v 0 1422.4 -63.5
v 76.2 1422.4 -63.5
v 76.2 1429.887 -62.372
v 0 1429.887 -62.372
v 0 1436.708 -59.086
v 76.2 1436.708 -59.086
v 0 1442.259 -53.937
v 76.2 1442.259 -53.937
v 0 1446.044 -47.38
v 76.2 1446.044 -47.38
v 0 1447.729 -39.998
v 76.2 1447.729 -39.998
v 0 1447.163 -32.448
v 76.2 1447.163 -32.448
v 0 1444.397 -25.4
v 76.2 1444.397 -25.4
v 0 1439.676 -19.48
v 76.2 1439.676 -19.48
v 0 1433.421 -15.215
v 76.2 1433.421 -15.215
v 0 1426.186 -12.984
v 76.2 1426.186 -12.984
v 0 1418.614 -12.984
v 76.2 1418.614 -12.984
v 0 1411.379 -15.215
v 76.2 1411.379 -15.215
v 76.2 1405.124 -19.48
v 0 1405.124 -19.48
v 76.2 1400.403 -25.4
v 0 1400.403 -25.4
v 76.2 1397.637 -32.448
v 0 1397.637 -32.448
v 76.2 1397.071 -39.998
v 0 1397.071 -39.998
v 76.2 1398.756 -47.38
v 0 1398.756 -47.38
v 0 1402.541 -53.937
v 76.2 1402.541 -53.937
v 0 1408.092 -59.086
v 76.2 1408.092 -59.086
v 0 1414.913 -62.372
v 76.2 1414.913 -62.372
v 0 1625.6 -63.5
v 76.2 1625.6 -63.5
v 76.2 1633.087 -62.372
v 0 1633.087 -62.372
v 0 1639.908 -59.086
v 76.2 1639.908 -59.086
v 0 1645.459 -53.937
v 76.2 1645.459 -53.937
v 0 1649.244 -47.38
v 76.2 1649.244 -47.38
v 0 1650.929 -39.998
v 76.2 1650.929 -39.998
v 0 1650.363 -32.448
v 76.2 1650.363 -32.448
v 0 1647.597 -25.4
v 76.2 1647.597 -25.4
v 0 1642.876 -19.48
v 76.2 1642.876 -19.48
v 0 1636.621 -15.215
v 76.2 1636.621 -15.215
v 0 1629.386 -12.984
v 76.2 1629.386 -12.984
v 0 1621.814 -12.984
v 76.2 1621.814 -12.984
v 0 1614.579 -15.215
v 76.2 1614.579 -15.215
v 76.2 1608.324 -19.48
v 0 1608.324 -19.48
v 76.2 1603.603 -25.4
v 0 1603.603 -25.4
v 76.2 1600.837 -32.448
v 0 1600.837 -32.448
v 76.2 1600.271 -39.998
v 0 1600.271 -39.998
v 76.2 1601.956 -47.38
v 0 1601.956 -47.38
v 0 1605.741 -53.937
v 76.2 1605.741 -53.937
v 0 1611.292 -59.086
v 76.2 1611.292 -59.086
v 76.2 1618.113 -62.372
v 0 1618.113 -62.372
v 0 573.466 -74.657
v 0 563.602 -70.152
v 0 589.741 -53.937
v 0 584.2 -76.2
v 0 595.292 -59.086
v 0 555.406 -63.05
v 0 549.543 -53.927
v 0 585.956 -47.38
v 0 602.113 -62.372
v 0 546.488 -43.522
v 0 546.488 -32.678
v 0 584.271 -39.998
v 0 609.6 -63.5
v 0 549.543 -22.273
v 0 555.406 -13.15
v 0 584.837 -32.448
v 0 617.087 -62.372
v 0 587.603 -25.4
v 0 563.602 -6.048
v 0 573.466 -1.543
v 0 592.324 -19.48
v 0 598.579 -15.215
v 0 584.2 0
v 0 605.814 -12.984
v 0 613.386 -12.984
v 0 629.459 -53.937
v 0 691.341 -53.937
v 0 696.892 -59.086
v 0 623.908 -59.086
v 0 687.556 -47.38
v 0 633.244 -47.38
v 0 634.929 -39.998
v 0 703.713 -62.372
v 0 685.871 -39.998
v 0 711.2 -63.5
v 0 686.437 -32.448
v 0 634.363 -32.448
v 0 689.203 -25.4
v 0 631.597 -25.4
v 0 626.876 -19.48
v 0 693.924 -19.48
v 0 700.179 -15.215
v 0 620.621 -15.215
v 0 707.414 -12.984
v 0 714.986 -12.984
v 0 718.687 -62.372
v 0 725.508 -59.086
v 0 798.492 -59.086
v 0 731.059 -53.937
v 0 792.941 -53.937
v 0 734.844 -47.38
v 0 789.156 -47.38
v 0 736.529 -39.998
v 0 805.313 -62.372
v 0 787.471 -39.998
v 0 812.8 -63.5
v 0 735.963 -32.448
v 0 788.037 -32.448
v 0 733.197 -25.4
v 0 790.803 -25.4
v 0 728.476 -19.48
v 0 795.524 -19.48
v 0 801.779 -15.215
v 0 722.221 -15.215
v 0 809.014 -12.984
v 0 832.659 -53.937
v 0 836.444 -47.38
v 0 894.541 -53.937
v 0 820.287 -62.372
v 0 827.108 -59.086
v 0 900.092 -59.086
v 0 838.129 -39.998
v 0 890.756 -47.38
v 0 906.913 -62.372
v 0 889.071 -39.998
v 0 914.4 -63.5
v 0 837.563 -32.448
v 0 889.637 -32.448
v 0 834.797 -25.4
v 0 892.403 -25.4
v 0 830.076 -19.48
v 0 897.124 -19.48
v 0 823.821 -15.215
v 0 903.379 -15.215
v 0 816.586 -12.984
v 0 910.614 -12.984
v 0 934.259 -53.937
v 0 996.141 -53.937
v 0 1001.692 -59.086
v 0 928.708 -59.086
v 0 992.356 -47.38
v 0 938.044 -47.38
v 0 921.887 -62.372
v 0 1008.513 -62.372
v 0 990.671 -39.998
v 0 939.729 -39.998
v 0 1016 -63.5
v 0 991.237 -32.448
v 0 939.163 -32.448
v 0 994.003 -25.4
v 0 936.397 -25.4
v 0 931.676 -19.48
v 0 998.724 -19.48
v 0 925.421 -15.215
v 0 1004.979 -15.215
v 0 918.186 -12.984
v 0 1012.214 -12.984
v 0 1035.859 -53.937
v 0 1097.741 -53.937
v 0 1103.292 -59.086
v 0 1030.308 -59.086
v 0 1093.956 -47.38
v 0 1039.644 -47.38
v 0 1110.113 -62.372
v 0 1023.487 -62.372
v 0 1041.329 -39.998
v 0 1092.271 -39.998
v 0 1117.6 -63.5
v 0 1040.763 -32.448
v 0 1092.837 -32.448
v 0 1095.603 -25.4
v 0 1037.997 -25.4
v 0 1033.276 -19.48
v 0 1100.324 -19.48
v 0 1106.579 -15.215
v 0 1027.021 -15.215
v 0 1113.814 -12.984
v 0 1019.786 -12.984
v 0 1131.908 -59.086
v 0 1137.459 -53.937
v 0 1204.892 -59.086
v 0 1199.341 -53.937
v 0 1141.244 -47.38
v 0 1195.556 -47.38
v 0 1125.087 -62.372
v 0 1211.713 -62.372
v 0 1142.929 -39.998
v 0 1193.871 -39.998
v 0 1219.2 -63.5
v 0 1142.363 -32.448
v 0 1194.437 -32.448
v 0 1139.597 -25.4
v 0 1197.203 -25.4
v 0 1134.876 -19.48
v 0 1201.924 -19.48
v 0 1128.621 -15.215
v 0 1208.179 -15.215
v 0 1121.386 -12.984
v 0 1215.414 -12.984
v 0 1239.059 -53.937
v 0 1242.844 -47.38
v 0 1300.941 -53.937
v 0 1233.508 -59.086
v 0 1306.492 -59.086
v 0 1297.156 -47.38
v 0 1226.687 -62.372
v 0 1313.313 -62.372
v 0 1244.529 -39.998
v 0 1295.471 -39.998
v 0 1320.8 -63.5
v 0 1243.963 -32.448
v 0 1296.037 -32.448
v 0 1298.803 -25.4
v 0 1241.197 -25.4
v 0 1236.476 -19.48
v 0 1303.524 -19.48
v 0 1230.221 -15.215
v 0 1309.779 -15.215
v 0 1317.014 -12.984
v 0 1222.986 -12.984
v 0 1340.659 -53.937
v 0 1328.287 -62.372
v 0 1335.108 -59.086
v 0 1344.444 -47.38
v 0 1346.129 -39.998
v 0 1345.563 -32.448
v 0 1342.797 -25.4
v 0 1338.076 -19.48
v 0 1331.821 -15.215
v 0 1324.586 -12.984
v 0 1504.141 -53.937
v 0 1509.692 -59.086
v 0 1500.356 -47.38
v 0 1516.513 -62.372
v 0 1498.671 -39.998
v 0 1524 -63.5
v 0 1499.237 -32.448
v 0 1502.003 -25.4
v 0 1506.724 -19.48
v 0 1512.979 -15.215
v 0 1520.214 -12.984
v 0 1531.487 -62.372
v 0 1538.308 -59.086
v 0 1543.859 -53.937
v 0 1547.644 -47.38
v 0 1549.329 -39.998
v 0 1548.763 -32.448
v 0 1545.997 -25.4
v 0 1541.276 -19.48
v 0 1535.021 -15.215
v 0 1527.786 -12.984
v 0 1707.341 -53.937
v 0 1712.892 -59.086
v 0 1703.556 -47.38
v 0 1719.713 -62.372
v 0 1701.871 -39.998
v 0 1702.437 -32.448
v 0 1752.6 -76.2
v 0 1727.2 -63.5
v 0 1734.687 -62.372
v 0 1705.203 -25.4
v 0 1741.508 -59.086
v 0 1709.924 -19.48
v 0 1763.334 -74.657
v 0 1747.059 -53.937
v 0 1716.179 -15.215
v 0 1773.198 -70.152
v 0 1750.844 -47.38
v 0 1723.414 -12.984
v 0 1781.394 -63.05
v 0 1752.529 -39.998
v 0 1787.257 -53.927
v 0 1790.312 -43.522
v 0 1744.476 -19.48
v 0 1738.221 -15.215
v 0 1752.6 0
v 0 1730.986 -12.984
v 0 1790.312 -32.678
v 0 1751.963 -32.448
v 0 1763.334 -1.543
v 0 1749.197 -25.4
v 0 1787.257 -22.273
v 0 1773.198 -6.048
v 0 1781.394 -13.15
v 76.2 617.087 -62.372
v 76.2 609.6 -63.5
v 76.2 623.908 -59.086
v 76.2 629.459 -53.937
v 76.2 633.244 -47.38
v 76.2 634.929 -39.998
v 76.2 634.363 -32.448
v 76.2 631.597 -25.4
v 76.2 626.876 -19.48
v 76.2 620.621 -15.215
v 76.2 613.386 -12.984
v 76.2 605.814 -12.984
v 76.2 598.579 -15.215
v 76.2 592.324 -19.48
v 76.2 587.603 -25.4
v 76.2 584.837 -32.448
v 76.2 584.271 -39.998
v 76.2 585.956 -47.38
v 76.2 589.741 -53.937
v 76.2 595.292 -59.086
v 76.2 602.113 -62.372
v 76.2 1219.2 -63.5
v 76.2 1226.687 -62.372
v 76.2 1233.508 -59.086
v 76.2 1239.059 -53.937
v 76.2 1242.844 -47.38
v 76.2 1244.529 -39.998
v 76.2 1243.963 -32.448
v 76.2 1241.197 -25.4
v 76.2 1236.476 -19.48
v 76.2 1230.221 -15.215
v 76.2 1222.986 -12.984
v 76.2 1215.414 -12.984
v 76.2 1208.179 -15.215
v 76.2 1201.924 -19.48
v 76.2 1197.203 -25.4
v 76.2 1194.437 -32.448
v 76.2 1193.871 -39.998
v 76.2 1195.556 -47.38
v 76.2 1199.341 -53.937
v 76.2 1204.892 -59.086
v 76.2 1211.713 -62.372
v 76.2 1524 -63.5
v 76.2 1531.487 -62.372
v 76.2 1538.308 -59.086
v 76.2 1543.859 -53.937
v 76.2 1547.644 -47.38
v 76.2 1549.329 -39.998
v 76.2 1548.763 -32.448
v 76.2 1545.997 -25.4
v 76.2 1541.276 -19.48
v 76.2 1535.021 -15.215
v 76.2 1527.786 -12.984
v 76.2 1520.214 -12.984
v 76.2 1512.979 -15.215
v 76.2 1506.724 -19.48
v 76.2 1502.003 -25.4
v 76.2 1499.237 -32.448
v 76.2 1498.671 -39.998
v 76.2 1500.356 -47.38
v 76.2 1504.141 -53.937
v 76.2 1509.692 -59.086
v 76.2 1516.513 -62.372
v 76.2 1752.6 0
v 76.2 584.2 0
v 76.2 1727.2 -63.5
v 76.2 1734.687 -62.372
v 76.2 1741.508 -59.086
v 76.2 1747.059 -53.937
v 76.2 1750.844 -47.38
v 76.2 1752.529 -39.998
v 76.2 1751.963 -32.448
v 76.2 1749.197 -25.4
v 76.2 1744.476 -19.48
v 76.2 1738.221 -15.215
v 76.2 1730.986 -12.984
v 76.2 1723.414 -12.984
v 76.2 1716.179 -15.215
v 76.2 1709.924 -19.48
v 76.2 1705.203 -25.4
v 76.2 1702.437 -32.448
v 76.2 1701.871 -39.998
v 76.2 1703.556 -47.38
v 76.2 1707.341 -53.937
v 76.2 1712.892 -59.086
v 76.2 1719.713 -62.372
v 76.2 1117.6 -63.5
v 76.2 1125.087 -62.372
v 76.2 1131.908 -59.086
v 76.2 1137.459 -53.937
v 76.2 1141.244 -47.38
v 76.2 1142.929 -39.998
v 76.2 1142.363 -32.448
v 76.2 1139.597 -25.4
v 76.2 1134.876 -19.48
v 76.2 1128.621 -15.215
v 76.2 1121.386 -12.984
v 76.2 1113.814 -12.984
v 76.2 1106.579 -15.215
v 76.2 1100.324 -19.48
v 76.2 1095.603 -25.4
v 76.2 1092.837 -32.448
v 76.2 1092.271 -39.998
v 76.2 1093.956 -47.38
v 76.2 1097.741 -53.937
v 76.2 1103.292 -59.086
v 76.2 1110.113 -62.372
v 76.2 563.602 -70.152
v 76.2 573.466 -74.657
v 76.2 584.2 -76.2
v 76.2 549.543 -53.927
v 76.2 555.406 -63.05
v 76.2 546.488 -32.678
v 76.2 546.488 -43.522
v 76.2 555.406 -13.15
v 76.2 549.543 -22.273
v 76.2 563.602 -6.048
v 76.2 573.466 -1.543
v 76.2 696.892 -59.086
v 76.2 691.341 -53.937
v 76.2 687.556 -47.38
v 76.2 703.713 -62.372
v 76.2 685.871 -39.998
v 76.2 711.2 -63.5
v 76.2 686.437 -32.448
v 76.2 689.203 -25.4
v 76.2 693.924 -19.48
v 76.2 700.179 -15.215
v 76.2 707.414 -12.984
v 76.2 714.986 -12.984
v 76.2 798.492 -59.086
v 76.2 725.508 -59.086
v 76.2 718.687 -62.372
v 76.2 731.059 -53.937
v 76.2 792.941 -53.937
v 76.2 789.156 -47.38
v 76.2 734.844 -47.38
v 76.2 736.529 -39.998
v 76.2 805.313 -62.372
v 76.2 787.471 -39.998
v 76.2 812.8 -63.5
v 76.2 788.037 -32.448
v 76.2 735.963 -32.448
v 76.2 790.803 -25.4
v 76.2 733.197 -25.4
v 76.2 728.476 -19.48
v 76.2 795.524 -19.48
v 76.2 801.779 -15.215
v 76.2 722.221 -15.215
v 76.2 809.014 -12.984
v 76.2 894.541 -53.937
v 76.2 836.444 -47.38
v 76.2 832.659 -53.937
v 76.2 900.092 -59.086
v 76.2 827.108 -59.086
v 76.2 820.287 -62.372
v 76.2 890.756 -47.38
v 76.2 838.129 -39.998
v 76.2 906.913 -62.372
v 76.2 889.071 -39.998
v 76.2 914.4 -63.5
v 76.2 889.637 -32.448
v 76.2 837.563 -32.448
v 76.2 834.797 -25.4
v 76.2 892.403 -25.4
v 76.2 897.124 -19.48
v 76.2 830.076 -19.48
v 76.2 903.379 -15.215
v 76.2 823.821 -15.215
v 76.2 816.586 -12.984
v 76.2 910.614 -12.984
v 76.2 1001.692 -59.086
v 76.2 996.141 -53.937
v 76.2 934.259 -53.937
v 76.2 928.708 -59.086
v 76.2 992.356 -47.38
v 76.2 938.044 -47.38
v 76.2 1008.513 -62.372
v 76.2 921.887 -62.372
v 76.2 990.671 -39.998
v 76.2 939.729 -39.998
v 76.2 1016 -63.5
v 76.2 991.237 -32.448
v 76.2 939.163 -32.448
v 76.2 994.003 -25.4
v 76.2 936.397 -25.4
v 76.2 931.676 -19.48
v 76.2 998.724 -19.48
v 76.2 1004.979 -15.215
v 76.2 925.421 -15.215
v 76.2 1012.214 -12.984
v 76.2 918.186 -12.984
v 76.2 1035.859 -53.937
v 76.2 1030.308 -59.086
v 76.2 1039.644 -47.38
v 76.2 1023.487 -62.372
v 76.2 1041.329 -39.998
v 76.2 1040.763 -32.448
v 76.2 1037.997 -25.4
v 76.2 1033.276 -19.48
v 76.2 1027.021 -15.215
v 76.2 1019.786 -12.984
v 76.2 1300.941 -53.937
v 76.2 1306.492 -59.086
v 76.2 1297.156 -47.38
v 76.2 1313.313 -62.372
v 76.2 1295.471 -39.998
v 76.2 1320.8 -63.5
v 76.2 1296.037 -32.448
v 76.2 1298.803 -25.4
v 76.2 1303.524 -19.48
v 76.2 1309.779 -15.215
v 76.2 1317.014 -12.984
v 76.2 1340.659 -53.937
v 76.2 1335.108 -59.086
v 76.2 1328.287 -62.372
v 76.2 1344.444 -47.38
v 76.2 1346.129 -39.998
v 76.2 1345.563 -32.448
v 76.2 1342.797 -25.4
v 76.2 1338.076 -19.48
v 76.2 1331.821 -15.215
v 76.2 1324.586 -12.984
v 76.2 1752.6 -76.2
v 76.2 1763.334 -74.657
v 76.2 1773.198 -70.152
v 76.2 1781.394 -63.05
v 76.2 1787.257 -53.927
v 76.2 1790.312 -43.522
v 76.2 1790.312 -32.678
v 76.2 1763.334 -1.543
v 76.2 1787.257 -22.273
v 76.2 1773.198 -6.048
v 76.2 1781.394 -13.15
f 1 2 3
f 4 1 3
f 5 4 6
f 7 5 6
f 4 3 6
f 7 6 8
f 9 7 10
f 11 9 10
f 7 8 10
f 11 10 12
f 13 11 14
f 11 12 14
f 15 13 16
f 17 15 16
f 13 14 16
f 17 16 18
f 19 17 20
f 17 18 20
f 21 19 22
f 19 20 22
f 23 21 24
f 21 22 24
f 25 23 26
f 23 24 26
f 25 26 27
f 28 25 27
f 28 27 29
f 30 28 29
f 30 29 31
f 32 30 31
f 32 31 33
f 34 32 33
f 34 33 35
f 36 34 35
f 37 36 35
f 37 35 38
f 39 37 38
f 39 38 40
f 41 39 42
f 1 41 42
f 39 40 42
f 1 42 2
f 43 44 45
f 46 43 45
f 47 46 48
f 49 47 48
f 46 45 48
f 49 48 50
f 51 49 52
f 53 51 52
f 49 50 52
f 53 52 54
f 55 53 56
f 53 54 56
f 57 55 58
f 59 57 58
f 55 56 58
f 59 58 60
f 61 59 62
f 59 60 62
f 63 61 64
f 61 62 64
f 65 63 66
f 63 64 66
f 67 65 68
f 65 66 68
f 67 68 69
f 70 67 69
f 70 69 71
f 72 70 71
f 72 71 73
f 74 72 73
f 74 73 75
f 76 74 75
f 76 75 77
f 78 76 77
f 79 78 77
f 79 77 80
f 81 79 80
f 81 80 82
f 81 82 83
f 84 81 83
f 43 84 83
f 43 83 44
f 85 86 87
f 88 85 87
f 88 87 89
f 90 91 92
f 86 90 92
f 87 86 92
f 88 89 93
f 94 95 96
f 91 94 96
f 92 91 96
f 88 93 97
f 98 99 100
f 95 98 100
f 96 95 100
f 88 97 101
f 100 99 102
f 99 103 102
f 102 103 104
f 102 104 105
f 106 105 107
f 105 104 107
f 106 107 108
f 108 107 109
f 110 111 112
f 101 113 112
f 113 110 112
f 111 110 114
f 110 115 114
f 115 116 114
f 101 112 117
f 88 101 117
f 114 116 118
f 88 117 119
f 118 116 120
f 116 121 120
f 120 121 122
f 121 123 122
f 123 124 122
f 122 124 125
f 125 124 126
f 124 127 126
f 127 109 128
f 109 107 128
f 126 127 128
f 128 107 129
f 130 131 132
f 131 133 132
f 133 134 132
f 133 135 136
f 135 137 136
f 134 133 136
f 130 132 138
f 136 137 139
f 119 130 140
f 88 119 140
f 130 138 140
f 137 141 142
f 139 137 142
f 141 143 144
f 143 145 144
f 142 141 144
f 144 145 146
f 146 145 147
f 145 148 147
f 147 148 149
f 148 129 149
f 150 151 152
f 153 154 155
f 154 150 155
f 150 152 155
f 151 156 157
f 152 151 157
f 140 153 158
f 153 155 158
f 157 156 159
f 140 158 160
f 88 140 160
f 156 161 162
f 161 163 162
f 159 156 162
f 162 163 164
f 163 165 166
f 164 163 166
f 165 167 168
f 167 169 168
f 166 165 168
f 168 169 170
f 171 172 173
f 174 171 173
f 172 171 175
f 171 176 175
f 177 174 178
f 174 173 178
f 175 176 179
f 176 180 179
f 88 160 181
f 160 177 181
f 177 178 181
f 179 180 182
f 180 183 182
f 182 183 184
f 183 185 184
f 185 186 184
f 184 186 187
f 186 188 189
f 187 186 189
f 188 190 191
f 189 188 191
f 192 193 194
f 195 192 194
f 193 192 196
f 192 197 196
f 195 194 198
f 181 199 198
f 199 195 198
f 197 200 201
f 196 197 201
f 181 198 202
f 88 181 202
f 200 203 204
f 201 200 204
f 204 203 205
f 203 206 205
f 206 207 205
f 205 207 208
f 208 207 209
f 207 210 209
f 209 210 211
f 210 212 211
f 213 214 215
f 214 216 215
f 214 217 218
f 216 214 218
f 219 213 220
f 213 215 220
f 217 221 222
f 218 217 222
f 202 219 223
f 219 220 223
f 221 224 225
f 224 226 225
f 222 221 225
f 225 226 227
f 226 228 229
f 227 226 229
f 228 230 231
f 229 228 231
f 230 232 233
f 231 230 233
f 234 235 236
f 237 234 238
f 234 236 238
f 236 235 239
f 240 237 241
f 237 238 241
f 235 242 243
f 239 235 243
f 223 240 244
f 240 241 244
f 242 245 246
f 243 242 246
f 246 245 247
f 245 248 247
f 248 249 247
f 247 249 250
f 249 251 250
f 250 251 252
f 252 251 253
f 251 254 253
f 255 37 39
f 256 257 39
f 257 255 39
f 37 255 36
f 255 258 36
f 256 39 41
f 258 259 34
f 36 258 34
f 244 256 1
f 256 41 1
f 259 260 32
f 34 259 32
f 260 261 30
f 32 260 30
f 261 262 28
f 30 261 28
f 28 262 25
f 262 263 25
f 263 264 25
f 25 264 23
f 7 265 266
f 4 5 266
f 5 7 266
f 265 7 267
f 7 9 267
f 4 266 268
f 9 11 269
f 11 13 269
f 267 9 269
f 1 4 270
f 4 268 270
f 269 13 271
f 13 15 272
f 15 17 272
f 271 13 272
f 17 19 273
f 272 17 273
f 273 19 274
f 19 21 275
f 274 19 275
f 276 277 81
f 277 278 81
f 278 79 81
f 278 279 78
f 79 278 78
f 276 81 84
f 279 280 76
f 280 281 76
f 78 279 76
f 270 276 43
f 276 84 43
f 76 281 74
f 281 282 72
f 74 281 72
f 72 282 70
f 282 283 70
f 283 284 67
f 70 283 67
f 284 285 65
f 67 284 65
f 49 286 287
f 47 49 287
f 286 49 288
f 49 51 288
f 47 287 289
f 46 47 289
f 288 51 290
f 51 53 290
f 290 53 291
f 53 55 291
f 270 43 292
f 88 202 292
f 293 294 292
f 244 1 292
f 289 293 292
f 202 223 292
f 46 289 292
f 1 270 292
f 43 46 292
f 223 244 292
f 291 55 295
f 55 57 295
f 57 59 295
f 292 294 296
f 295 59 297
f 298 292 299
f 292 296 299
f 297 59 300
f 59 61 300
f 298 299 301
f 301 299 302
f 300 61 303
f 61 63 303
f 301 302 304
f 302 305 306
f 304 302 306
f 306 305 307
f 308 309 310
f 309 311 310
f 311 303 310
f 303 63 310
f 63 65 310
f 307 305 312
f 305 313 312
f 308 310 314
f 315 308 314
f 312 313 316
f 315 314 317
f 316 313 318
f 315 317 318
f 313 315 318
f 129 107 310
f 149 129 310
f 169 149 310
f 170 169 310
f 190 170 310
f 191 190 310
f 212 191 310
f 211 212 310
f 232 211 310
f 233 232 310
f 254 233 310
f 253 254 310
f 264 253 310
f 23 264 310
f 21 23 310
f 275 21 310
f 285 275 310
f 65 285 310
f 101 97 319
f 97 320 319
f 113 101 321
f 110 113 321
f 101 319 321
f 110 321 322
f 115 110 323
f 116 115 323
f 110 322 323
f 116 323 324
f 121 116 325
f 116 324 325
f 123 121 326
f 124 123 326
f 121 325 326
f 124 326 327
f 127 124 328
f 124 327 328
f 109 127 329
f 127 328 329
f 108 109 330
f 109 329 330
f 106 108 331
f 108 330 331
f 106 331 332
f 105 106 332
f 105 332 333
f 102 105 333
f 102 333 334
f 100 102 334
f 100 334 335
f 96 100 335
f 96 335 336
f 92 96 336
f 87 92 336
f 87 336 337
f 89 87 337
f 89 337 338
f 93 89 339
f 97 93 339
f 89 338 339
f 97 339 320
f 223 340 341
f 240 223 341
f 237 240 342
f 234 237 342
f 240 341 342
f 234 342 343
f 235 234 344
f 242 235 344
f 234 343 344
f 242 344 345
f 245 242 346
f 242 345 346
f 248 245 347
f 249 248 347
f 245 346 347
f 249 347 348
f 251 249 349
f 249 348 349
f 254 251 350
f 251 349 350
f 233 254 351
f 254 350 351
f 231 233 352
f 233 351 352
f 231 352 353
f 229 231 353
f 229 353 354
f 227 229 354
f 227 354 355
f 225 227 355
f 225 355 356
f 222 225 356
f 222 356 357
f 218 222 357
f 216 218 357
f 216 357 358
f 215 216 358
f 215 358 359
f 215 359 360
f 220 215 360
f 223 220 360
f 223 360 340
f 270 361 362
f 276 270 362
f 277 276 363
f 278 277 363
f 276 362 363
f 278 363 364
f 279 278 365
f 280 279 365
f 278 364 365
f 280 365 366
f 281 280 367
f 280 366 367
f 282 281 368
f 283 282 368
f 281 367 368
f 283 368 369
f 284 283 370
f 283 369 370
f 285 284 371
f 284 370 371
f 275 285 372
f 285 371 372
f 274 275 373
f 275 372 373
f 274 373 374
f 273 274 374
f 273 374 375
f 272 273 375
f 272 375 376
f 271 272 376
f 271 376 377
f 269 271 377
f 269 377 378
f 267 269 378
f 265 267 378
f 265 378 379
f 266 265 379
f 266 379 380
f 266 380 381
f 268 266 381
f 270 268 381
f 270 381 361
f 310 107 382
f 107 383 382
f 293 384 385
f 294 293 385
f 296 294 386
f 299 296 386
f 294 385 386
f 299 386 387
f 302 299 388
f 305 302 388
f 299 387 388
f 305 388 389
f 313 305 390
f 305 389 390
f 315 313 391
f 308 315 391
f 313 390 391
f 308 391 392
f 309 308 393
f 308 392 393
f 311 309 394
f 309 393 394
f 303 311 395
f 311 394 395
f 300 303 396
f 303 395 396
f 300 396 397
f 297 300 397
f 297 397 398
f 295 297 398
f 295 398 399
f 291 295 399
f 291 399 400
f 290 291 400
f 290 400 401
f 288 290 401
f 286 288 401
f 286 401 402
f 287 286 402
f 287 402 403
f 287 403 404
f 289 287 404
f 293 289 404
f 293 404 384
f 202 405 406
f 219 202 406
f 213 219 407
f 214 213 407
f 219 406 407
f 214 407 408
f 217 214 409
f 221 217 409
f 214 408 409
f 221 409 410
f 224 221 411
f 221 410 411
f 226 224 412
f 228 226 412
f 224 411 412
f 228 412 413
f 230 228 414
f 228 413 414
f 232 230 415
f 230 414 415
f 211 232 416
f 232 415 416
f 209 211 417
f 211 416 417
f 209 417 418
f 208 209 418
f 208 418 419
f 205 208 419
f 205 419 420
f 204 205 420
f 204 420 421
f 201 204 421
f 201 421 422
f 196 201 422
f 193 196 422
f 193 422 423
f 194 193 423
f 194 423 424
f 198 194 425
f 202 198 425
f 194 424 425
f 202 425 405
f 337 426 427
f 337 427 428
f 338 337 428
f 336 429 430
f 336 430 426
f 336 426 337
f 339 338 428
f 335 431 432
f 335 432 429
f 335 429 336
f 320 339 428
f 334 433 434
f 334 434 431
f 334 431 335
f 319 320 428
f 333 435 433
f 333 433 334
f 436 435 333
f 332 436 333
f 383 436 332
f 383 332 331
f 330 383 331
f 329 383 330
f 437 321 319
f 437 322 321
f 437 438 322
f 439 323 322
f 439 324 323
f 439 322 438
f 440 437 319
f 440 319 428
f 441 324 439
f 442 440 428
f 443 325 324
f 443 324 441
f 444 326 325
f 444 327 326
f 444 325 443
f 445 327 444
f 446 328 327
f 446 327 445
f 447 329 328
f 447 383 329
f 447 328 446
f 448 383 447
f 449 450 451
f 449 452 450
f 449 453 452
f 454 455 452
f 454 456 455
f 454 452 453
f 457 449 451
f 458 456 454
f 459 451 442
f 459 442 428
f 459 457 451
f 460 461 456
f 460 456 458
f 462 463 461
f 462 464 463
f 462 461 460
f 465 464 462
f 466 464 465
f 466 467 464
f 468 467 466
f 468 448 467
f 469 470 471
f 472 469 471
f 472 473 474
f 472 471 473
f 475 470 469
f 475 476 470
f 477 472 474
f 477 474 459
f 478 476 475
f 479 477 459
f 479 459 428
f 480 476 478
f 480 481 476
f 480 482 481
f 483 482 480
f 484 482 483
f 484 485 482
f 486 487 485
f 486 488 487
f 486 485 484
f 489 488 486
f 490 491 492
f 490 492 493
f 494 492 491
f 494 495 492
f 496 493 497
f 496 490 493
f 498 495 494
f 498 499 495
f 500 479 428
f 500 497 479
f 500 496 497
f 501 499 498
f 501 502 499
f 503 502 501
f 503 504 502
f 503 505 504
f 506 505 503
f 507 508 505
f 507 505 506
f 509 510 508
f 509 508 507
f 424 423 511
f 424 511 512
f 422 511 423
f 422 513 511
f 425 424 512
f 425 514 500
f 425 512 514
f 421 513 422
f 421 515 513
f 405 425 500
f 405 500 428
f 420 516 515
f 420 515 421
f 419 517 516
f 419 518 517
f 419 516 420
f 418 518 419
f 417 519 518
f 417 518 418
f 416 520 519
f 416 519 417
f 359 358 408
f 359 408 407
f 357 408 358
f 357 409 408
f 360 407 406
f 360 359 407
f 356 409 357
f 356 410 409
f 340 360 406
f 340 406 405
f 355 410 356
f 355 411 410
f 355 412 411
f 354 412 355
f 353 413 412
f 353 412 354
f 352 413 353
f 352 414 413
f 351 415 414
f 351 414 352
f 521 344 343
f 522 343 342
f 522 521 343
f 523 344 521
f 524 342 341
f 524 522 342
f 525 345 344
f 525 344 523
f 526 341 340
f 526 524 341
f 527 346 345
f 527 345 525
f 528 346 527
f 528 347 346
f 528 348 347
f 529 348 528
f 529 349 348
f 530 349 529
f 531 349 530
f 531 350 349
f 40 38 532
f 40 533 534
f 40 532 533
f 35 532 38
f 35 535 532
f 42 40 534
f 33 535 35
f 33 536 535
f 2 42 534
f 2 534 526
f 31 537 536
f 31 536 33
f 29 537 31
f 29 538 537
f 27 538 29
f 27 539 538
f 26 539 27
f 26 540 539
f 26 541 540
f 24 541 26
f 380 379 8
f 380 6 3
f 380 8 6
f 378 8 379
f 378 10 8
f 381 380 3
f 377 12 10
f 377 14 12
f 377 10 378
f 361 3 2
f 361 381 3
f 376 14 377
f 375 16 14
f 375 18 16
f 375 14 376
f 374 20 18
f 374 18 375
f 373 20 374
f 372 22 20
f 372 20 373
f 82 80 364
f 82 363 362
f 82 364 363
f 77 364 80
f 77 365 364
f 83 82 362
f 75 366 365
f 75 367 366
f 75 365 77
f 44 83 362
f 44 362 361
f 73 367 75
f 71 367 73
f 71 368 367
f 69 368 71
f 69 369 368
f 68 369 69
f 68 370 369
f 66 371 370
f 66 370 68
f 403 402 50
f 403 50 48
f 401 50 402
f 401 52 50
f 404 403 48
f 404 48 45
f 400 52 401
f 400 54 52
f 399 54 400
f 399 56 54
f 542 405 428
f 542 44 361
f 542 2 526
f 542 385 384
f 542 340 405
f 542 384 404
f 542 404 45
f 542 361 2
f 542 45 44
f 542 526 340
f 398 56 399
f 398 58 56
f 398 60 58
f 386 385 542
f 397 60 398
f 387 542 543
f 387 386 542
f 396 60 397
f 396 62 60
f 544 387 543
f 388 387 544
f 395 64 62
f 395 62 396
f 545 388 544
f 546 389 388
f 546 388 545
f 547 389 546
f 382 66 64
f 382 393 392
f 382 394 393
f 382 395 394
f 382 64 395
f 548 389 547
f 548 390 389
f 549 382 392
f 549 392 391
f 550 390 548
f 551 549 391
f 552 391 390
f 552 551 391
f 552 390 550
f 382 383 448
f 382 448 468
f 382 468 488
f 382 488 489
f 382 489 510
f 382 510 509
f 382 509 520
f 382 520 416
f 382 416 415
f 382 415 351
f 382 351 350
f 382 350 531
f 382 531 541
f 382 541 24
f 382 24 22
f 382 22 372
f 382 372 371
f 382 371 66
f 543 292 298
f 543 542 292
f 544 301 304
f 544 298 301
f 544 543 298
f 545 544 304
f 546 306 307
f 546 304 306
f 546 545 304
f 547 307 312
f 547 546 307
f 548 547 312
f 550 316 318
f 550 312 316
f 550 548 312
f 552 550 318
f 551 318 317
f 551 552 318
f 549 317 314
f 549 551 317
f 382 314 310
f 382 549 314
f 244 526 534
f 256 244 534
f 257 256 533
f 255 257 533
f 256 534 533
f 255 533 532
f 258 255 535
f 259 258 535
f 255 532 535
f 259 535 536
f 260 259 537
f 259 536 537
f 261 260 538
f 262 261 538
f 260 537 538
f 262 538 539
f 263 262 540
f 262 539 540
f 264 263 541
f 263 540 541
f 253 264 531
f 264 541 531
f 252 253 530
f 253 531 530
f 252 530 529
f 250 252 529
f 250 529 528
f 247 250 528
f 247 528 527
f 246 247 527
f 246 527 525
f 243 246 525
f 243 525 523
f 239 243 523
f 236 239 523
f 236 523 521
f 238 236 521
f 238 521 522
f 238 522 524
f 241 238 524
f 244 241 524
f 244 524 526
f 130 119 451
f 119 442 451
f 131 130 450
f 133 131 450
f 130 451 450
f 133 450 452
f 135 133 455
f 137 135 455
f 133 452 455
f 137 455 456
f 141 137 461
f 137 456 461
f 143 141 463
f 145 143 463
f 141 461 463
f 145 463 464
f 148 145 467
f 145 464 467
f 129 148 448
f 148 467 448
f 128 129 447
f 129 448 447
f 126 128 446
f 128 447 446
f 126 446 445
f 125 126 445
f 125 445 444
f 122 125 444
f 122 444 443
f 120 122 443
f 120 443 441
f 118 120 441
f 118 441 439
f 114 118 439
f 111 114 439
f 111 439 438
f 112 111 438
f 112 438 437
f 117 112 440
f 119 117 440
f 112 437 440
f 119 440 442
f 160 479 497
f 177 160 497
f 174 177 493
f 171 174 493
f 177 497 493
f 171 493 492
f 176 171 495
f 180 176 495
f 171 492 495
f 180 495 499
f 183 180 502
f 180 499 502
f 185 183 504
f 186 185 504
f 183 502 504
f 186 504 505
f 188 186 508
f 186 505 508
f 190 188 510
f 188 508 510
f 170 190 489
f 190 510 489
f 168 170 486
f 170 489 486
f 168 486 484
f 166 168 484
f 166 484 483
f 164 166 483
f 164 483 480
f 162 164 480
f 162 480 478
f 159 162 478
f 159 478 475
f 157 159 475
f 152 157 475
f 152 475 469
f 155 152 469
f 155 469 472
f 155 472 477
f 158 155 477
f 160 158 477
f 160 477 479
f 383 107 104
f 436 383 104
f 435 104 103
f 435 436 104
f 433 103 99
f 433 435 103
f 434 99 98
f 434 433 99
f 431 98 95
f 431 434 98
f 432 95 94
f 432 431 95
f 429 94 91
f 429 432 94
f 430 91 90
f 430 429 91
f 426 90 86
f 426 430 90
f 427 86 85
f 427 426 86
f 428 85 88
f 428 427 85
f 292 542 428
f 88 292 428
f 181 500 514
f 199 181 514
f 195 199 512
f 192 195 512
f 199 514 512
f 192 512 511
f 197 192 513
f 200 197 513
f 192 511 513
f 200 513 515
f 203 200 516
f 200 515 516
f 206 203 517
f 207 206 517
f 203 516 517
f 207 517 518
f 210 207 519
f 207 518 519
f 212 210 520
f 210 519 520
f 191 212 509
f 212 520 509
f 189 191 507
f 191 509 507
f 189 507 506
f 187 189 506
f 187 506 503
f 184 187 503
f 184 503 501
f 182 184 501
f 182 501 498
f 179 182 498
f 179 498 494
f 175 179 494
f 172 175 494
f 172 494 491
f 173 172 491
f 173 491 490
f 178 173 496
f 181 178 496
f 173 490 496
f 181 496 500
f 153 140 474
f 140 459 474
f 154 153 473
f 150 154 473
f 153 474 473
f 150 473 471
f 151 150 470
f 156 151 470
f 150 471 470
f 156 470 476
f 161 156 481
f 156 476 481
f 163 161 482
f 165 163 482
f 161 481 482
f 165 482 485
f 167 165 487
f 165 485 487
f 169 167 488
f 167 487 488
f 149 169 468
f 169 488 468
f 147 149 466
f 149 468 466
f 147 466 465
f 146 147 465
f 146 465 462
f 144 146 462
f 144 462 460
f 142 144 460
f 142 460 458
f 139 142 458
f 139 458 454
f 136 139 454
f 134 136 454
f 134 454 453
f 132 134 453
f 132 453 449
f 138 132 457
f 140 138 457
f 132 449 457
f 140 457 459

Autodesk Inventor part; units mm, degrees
ref_plane "YZ Plane" through (0, 0, 0) normal (1, 0, 0) x (0, 1, 0)
ref_plane "XZ Plane" through (0, 0, 0) normal (0, 1, 0) x (-1, 0, 0)
ref_plane "XY Plane" through (0, 0, 0) normal (0, 0, 1) x (1, 0, 0)
sketch "Sketch1" plane through (0, 0, 0) normal (1, 0, 0) x (0, 1, 0)
  line L0 (0, 0) -> (1828.8, 0)
  line L1 (1828.8, 0) -> (1828.8, -76.2)
  line L2 (1828.8, -76.2) -> (0, -76.2)
  line L3 (0, -76.2) -> (0, 0)
  dimension "d0" = 1828.8
  dimension "d1" = 76.2
extrude "Extrusion1" add sketch "Sketch1" along normal blind 76.2
sketch "Sketch2" plane through (76.2, 0, 0) normal (1, 0, 0) x (0, 0, -1)
  circle A0 centre (38.1, 101.6) radius 25.4
  circle A1 centre (38.1, 203.2) radius 25.4
  circle A2 centre (38.1, 304.8) radius 25.4
  circle A3 centre (38.1, 406.4) radius 25.4
  circle A4 centre (38.1, 508) radius 25.4
  circle A5 centre (38.1, 609.6) radius 25.4
  circle A6 centre (38.1, 711.2) radius 25.4
  circle A7 centre (38.1, 812.8) radius 25.4
  circle A8 centre (38.1, 914.4) radius 25.4
  circle A9 centre (38.1, 1016) radius 25.4
  circle A10 centre (38.1, 1117.6) radius 25.4
  circle A11 centre (38.1, 1219.2) radius 25.4
  circle A12 centre (38.1, 1320.8) radius 25.4
  circle A13 centre (38.1, 1422.4) radius 25.4
  circle A14 centre (38.1, 1524) radius 25.4
  circle A15 centre (38.1, 1625.6) radius 25.4
  circle A16 centre (38.1, 1727.2) radius 25.4
  point P0 (0, 0)
  dimension "d4" = 50.8
  dimension "d5" = 50.8
  dimension "d6" = 50.8
  dimension "d7" = 50.8
  dimension "d8" = 50.8
  dimension "d9" = 50.8
  dimension "d10" = 50.8
  dimension "d11" = 50.8
  dimension "d12" = 50.8
  dimension "d13" = 50.8
  dimension "d14" = 50.8
  dimension "d15" = 50.8
  dimension "d16" = 50.8
  dimension "d17" = 50.8
  dimension "d18" = 50.8
  dimension "d19" = 50.8
  dimension "d20" = 50.8
extrude "Extrusion2" cut sketch "Sketch2" against normal blind 127
sketch "Sketch3" plane through (76.2, 0, 0) normal (1, 0, 0) x (0, 0, -1)
  circle A0 centre (38.1, 38.1) radius 38.1
  circle A1 centre (38.1, 1790.7) radius 38.1
  line L0 (76.2, 1828.8) -> (0, 1828.8) projected
  line L1 (0, 0) -> (0, 1828.8) projected
  line L2 (0, 38.1) -> (0, 1790.7)
  line L3 (76.2, 1828.8) -> (76.2, 0) projected
  line L4 (76.2, 1790.7) -> (76.2, 38.1)
  line L5 (0, 38.1) -> (0, 0)
  line L6 (0, 0) -> (76.2, 0)
  line L7 (76.2, 0) -> (76.2, 38.1)
  circle A2 centre (38.1, 1727.2) radius 25.4 projected
  circle A3 centre (38.1, 1752.6) radius 38.1
  line L8 (0, 1752.6) -> (0, 1738.3207)
  line L9 (76.2, 1752.6) -> (76.2, 1722.009)
  circle A4 centre (38.1, 609.6) radius 25.4 projected
  circle A5 centre (38.1, 584.2) radius 38.1
  line L10 (0, 584.2) -> (0, 799.9293)
  line L11 (76.2, 799.9293) -> (76.2, 584.2)
extrude "Extrusion3" cut sketch "Sketch3" against normal blind 76.2 contours A5 A4 L1 A3 A2 L3 | A5 A4 | A5 A4 | A4 A5 | A3 A2 A1 | A3 A1 A2 | A1 A3 | A3 A2 | A2 A3 keep common part picked at (40.7405, 1765.5775)
properties part number "pole_2"
